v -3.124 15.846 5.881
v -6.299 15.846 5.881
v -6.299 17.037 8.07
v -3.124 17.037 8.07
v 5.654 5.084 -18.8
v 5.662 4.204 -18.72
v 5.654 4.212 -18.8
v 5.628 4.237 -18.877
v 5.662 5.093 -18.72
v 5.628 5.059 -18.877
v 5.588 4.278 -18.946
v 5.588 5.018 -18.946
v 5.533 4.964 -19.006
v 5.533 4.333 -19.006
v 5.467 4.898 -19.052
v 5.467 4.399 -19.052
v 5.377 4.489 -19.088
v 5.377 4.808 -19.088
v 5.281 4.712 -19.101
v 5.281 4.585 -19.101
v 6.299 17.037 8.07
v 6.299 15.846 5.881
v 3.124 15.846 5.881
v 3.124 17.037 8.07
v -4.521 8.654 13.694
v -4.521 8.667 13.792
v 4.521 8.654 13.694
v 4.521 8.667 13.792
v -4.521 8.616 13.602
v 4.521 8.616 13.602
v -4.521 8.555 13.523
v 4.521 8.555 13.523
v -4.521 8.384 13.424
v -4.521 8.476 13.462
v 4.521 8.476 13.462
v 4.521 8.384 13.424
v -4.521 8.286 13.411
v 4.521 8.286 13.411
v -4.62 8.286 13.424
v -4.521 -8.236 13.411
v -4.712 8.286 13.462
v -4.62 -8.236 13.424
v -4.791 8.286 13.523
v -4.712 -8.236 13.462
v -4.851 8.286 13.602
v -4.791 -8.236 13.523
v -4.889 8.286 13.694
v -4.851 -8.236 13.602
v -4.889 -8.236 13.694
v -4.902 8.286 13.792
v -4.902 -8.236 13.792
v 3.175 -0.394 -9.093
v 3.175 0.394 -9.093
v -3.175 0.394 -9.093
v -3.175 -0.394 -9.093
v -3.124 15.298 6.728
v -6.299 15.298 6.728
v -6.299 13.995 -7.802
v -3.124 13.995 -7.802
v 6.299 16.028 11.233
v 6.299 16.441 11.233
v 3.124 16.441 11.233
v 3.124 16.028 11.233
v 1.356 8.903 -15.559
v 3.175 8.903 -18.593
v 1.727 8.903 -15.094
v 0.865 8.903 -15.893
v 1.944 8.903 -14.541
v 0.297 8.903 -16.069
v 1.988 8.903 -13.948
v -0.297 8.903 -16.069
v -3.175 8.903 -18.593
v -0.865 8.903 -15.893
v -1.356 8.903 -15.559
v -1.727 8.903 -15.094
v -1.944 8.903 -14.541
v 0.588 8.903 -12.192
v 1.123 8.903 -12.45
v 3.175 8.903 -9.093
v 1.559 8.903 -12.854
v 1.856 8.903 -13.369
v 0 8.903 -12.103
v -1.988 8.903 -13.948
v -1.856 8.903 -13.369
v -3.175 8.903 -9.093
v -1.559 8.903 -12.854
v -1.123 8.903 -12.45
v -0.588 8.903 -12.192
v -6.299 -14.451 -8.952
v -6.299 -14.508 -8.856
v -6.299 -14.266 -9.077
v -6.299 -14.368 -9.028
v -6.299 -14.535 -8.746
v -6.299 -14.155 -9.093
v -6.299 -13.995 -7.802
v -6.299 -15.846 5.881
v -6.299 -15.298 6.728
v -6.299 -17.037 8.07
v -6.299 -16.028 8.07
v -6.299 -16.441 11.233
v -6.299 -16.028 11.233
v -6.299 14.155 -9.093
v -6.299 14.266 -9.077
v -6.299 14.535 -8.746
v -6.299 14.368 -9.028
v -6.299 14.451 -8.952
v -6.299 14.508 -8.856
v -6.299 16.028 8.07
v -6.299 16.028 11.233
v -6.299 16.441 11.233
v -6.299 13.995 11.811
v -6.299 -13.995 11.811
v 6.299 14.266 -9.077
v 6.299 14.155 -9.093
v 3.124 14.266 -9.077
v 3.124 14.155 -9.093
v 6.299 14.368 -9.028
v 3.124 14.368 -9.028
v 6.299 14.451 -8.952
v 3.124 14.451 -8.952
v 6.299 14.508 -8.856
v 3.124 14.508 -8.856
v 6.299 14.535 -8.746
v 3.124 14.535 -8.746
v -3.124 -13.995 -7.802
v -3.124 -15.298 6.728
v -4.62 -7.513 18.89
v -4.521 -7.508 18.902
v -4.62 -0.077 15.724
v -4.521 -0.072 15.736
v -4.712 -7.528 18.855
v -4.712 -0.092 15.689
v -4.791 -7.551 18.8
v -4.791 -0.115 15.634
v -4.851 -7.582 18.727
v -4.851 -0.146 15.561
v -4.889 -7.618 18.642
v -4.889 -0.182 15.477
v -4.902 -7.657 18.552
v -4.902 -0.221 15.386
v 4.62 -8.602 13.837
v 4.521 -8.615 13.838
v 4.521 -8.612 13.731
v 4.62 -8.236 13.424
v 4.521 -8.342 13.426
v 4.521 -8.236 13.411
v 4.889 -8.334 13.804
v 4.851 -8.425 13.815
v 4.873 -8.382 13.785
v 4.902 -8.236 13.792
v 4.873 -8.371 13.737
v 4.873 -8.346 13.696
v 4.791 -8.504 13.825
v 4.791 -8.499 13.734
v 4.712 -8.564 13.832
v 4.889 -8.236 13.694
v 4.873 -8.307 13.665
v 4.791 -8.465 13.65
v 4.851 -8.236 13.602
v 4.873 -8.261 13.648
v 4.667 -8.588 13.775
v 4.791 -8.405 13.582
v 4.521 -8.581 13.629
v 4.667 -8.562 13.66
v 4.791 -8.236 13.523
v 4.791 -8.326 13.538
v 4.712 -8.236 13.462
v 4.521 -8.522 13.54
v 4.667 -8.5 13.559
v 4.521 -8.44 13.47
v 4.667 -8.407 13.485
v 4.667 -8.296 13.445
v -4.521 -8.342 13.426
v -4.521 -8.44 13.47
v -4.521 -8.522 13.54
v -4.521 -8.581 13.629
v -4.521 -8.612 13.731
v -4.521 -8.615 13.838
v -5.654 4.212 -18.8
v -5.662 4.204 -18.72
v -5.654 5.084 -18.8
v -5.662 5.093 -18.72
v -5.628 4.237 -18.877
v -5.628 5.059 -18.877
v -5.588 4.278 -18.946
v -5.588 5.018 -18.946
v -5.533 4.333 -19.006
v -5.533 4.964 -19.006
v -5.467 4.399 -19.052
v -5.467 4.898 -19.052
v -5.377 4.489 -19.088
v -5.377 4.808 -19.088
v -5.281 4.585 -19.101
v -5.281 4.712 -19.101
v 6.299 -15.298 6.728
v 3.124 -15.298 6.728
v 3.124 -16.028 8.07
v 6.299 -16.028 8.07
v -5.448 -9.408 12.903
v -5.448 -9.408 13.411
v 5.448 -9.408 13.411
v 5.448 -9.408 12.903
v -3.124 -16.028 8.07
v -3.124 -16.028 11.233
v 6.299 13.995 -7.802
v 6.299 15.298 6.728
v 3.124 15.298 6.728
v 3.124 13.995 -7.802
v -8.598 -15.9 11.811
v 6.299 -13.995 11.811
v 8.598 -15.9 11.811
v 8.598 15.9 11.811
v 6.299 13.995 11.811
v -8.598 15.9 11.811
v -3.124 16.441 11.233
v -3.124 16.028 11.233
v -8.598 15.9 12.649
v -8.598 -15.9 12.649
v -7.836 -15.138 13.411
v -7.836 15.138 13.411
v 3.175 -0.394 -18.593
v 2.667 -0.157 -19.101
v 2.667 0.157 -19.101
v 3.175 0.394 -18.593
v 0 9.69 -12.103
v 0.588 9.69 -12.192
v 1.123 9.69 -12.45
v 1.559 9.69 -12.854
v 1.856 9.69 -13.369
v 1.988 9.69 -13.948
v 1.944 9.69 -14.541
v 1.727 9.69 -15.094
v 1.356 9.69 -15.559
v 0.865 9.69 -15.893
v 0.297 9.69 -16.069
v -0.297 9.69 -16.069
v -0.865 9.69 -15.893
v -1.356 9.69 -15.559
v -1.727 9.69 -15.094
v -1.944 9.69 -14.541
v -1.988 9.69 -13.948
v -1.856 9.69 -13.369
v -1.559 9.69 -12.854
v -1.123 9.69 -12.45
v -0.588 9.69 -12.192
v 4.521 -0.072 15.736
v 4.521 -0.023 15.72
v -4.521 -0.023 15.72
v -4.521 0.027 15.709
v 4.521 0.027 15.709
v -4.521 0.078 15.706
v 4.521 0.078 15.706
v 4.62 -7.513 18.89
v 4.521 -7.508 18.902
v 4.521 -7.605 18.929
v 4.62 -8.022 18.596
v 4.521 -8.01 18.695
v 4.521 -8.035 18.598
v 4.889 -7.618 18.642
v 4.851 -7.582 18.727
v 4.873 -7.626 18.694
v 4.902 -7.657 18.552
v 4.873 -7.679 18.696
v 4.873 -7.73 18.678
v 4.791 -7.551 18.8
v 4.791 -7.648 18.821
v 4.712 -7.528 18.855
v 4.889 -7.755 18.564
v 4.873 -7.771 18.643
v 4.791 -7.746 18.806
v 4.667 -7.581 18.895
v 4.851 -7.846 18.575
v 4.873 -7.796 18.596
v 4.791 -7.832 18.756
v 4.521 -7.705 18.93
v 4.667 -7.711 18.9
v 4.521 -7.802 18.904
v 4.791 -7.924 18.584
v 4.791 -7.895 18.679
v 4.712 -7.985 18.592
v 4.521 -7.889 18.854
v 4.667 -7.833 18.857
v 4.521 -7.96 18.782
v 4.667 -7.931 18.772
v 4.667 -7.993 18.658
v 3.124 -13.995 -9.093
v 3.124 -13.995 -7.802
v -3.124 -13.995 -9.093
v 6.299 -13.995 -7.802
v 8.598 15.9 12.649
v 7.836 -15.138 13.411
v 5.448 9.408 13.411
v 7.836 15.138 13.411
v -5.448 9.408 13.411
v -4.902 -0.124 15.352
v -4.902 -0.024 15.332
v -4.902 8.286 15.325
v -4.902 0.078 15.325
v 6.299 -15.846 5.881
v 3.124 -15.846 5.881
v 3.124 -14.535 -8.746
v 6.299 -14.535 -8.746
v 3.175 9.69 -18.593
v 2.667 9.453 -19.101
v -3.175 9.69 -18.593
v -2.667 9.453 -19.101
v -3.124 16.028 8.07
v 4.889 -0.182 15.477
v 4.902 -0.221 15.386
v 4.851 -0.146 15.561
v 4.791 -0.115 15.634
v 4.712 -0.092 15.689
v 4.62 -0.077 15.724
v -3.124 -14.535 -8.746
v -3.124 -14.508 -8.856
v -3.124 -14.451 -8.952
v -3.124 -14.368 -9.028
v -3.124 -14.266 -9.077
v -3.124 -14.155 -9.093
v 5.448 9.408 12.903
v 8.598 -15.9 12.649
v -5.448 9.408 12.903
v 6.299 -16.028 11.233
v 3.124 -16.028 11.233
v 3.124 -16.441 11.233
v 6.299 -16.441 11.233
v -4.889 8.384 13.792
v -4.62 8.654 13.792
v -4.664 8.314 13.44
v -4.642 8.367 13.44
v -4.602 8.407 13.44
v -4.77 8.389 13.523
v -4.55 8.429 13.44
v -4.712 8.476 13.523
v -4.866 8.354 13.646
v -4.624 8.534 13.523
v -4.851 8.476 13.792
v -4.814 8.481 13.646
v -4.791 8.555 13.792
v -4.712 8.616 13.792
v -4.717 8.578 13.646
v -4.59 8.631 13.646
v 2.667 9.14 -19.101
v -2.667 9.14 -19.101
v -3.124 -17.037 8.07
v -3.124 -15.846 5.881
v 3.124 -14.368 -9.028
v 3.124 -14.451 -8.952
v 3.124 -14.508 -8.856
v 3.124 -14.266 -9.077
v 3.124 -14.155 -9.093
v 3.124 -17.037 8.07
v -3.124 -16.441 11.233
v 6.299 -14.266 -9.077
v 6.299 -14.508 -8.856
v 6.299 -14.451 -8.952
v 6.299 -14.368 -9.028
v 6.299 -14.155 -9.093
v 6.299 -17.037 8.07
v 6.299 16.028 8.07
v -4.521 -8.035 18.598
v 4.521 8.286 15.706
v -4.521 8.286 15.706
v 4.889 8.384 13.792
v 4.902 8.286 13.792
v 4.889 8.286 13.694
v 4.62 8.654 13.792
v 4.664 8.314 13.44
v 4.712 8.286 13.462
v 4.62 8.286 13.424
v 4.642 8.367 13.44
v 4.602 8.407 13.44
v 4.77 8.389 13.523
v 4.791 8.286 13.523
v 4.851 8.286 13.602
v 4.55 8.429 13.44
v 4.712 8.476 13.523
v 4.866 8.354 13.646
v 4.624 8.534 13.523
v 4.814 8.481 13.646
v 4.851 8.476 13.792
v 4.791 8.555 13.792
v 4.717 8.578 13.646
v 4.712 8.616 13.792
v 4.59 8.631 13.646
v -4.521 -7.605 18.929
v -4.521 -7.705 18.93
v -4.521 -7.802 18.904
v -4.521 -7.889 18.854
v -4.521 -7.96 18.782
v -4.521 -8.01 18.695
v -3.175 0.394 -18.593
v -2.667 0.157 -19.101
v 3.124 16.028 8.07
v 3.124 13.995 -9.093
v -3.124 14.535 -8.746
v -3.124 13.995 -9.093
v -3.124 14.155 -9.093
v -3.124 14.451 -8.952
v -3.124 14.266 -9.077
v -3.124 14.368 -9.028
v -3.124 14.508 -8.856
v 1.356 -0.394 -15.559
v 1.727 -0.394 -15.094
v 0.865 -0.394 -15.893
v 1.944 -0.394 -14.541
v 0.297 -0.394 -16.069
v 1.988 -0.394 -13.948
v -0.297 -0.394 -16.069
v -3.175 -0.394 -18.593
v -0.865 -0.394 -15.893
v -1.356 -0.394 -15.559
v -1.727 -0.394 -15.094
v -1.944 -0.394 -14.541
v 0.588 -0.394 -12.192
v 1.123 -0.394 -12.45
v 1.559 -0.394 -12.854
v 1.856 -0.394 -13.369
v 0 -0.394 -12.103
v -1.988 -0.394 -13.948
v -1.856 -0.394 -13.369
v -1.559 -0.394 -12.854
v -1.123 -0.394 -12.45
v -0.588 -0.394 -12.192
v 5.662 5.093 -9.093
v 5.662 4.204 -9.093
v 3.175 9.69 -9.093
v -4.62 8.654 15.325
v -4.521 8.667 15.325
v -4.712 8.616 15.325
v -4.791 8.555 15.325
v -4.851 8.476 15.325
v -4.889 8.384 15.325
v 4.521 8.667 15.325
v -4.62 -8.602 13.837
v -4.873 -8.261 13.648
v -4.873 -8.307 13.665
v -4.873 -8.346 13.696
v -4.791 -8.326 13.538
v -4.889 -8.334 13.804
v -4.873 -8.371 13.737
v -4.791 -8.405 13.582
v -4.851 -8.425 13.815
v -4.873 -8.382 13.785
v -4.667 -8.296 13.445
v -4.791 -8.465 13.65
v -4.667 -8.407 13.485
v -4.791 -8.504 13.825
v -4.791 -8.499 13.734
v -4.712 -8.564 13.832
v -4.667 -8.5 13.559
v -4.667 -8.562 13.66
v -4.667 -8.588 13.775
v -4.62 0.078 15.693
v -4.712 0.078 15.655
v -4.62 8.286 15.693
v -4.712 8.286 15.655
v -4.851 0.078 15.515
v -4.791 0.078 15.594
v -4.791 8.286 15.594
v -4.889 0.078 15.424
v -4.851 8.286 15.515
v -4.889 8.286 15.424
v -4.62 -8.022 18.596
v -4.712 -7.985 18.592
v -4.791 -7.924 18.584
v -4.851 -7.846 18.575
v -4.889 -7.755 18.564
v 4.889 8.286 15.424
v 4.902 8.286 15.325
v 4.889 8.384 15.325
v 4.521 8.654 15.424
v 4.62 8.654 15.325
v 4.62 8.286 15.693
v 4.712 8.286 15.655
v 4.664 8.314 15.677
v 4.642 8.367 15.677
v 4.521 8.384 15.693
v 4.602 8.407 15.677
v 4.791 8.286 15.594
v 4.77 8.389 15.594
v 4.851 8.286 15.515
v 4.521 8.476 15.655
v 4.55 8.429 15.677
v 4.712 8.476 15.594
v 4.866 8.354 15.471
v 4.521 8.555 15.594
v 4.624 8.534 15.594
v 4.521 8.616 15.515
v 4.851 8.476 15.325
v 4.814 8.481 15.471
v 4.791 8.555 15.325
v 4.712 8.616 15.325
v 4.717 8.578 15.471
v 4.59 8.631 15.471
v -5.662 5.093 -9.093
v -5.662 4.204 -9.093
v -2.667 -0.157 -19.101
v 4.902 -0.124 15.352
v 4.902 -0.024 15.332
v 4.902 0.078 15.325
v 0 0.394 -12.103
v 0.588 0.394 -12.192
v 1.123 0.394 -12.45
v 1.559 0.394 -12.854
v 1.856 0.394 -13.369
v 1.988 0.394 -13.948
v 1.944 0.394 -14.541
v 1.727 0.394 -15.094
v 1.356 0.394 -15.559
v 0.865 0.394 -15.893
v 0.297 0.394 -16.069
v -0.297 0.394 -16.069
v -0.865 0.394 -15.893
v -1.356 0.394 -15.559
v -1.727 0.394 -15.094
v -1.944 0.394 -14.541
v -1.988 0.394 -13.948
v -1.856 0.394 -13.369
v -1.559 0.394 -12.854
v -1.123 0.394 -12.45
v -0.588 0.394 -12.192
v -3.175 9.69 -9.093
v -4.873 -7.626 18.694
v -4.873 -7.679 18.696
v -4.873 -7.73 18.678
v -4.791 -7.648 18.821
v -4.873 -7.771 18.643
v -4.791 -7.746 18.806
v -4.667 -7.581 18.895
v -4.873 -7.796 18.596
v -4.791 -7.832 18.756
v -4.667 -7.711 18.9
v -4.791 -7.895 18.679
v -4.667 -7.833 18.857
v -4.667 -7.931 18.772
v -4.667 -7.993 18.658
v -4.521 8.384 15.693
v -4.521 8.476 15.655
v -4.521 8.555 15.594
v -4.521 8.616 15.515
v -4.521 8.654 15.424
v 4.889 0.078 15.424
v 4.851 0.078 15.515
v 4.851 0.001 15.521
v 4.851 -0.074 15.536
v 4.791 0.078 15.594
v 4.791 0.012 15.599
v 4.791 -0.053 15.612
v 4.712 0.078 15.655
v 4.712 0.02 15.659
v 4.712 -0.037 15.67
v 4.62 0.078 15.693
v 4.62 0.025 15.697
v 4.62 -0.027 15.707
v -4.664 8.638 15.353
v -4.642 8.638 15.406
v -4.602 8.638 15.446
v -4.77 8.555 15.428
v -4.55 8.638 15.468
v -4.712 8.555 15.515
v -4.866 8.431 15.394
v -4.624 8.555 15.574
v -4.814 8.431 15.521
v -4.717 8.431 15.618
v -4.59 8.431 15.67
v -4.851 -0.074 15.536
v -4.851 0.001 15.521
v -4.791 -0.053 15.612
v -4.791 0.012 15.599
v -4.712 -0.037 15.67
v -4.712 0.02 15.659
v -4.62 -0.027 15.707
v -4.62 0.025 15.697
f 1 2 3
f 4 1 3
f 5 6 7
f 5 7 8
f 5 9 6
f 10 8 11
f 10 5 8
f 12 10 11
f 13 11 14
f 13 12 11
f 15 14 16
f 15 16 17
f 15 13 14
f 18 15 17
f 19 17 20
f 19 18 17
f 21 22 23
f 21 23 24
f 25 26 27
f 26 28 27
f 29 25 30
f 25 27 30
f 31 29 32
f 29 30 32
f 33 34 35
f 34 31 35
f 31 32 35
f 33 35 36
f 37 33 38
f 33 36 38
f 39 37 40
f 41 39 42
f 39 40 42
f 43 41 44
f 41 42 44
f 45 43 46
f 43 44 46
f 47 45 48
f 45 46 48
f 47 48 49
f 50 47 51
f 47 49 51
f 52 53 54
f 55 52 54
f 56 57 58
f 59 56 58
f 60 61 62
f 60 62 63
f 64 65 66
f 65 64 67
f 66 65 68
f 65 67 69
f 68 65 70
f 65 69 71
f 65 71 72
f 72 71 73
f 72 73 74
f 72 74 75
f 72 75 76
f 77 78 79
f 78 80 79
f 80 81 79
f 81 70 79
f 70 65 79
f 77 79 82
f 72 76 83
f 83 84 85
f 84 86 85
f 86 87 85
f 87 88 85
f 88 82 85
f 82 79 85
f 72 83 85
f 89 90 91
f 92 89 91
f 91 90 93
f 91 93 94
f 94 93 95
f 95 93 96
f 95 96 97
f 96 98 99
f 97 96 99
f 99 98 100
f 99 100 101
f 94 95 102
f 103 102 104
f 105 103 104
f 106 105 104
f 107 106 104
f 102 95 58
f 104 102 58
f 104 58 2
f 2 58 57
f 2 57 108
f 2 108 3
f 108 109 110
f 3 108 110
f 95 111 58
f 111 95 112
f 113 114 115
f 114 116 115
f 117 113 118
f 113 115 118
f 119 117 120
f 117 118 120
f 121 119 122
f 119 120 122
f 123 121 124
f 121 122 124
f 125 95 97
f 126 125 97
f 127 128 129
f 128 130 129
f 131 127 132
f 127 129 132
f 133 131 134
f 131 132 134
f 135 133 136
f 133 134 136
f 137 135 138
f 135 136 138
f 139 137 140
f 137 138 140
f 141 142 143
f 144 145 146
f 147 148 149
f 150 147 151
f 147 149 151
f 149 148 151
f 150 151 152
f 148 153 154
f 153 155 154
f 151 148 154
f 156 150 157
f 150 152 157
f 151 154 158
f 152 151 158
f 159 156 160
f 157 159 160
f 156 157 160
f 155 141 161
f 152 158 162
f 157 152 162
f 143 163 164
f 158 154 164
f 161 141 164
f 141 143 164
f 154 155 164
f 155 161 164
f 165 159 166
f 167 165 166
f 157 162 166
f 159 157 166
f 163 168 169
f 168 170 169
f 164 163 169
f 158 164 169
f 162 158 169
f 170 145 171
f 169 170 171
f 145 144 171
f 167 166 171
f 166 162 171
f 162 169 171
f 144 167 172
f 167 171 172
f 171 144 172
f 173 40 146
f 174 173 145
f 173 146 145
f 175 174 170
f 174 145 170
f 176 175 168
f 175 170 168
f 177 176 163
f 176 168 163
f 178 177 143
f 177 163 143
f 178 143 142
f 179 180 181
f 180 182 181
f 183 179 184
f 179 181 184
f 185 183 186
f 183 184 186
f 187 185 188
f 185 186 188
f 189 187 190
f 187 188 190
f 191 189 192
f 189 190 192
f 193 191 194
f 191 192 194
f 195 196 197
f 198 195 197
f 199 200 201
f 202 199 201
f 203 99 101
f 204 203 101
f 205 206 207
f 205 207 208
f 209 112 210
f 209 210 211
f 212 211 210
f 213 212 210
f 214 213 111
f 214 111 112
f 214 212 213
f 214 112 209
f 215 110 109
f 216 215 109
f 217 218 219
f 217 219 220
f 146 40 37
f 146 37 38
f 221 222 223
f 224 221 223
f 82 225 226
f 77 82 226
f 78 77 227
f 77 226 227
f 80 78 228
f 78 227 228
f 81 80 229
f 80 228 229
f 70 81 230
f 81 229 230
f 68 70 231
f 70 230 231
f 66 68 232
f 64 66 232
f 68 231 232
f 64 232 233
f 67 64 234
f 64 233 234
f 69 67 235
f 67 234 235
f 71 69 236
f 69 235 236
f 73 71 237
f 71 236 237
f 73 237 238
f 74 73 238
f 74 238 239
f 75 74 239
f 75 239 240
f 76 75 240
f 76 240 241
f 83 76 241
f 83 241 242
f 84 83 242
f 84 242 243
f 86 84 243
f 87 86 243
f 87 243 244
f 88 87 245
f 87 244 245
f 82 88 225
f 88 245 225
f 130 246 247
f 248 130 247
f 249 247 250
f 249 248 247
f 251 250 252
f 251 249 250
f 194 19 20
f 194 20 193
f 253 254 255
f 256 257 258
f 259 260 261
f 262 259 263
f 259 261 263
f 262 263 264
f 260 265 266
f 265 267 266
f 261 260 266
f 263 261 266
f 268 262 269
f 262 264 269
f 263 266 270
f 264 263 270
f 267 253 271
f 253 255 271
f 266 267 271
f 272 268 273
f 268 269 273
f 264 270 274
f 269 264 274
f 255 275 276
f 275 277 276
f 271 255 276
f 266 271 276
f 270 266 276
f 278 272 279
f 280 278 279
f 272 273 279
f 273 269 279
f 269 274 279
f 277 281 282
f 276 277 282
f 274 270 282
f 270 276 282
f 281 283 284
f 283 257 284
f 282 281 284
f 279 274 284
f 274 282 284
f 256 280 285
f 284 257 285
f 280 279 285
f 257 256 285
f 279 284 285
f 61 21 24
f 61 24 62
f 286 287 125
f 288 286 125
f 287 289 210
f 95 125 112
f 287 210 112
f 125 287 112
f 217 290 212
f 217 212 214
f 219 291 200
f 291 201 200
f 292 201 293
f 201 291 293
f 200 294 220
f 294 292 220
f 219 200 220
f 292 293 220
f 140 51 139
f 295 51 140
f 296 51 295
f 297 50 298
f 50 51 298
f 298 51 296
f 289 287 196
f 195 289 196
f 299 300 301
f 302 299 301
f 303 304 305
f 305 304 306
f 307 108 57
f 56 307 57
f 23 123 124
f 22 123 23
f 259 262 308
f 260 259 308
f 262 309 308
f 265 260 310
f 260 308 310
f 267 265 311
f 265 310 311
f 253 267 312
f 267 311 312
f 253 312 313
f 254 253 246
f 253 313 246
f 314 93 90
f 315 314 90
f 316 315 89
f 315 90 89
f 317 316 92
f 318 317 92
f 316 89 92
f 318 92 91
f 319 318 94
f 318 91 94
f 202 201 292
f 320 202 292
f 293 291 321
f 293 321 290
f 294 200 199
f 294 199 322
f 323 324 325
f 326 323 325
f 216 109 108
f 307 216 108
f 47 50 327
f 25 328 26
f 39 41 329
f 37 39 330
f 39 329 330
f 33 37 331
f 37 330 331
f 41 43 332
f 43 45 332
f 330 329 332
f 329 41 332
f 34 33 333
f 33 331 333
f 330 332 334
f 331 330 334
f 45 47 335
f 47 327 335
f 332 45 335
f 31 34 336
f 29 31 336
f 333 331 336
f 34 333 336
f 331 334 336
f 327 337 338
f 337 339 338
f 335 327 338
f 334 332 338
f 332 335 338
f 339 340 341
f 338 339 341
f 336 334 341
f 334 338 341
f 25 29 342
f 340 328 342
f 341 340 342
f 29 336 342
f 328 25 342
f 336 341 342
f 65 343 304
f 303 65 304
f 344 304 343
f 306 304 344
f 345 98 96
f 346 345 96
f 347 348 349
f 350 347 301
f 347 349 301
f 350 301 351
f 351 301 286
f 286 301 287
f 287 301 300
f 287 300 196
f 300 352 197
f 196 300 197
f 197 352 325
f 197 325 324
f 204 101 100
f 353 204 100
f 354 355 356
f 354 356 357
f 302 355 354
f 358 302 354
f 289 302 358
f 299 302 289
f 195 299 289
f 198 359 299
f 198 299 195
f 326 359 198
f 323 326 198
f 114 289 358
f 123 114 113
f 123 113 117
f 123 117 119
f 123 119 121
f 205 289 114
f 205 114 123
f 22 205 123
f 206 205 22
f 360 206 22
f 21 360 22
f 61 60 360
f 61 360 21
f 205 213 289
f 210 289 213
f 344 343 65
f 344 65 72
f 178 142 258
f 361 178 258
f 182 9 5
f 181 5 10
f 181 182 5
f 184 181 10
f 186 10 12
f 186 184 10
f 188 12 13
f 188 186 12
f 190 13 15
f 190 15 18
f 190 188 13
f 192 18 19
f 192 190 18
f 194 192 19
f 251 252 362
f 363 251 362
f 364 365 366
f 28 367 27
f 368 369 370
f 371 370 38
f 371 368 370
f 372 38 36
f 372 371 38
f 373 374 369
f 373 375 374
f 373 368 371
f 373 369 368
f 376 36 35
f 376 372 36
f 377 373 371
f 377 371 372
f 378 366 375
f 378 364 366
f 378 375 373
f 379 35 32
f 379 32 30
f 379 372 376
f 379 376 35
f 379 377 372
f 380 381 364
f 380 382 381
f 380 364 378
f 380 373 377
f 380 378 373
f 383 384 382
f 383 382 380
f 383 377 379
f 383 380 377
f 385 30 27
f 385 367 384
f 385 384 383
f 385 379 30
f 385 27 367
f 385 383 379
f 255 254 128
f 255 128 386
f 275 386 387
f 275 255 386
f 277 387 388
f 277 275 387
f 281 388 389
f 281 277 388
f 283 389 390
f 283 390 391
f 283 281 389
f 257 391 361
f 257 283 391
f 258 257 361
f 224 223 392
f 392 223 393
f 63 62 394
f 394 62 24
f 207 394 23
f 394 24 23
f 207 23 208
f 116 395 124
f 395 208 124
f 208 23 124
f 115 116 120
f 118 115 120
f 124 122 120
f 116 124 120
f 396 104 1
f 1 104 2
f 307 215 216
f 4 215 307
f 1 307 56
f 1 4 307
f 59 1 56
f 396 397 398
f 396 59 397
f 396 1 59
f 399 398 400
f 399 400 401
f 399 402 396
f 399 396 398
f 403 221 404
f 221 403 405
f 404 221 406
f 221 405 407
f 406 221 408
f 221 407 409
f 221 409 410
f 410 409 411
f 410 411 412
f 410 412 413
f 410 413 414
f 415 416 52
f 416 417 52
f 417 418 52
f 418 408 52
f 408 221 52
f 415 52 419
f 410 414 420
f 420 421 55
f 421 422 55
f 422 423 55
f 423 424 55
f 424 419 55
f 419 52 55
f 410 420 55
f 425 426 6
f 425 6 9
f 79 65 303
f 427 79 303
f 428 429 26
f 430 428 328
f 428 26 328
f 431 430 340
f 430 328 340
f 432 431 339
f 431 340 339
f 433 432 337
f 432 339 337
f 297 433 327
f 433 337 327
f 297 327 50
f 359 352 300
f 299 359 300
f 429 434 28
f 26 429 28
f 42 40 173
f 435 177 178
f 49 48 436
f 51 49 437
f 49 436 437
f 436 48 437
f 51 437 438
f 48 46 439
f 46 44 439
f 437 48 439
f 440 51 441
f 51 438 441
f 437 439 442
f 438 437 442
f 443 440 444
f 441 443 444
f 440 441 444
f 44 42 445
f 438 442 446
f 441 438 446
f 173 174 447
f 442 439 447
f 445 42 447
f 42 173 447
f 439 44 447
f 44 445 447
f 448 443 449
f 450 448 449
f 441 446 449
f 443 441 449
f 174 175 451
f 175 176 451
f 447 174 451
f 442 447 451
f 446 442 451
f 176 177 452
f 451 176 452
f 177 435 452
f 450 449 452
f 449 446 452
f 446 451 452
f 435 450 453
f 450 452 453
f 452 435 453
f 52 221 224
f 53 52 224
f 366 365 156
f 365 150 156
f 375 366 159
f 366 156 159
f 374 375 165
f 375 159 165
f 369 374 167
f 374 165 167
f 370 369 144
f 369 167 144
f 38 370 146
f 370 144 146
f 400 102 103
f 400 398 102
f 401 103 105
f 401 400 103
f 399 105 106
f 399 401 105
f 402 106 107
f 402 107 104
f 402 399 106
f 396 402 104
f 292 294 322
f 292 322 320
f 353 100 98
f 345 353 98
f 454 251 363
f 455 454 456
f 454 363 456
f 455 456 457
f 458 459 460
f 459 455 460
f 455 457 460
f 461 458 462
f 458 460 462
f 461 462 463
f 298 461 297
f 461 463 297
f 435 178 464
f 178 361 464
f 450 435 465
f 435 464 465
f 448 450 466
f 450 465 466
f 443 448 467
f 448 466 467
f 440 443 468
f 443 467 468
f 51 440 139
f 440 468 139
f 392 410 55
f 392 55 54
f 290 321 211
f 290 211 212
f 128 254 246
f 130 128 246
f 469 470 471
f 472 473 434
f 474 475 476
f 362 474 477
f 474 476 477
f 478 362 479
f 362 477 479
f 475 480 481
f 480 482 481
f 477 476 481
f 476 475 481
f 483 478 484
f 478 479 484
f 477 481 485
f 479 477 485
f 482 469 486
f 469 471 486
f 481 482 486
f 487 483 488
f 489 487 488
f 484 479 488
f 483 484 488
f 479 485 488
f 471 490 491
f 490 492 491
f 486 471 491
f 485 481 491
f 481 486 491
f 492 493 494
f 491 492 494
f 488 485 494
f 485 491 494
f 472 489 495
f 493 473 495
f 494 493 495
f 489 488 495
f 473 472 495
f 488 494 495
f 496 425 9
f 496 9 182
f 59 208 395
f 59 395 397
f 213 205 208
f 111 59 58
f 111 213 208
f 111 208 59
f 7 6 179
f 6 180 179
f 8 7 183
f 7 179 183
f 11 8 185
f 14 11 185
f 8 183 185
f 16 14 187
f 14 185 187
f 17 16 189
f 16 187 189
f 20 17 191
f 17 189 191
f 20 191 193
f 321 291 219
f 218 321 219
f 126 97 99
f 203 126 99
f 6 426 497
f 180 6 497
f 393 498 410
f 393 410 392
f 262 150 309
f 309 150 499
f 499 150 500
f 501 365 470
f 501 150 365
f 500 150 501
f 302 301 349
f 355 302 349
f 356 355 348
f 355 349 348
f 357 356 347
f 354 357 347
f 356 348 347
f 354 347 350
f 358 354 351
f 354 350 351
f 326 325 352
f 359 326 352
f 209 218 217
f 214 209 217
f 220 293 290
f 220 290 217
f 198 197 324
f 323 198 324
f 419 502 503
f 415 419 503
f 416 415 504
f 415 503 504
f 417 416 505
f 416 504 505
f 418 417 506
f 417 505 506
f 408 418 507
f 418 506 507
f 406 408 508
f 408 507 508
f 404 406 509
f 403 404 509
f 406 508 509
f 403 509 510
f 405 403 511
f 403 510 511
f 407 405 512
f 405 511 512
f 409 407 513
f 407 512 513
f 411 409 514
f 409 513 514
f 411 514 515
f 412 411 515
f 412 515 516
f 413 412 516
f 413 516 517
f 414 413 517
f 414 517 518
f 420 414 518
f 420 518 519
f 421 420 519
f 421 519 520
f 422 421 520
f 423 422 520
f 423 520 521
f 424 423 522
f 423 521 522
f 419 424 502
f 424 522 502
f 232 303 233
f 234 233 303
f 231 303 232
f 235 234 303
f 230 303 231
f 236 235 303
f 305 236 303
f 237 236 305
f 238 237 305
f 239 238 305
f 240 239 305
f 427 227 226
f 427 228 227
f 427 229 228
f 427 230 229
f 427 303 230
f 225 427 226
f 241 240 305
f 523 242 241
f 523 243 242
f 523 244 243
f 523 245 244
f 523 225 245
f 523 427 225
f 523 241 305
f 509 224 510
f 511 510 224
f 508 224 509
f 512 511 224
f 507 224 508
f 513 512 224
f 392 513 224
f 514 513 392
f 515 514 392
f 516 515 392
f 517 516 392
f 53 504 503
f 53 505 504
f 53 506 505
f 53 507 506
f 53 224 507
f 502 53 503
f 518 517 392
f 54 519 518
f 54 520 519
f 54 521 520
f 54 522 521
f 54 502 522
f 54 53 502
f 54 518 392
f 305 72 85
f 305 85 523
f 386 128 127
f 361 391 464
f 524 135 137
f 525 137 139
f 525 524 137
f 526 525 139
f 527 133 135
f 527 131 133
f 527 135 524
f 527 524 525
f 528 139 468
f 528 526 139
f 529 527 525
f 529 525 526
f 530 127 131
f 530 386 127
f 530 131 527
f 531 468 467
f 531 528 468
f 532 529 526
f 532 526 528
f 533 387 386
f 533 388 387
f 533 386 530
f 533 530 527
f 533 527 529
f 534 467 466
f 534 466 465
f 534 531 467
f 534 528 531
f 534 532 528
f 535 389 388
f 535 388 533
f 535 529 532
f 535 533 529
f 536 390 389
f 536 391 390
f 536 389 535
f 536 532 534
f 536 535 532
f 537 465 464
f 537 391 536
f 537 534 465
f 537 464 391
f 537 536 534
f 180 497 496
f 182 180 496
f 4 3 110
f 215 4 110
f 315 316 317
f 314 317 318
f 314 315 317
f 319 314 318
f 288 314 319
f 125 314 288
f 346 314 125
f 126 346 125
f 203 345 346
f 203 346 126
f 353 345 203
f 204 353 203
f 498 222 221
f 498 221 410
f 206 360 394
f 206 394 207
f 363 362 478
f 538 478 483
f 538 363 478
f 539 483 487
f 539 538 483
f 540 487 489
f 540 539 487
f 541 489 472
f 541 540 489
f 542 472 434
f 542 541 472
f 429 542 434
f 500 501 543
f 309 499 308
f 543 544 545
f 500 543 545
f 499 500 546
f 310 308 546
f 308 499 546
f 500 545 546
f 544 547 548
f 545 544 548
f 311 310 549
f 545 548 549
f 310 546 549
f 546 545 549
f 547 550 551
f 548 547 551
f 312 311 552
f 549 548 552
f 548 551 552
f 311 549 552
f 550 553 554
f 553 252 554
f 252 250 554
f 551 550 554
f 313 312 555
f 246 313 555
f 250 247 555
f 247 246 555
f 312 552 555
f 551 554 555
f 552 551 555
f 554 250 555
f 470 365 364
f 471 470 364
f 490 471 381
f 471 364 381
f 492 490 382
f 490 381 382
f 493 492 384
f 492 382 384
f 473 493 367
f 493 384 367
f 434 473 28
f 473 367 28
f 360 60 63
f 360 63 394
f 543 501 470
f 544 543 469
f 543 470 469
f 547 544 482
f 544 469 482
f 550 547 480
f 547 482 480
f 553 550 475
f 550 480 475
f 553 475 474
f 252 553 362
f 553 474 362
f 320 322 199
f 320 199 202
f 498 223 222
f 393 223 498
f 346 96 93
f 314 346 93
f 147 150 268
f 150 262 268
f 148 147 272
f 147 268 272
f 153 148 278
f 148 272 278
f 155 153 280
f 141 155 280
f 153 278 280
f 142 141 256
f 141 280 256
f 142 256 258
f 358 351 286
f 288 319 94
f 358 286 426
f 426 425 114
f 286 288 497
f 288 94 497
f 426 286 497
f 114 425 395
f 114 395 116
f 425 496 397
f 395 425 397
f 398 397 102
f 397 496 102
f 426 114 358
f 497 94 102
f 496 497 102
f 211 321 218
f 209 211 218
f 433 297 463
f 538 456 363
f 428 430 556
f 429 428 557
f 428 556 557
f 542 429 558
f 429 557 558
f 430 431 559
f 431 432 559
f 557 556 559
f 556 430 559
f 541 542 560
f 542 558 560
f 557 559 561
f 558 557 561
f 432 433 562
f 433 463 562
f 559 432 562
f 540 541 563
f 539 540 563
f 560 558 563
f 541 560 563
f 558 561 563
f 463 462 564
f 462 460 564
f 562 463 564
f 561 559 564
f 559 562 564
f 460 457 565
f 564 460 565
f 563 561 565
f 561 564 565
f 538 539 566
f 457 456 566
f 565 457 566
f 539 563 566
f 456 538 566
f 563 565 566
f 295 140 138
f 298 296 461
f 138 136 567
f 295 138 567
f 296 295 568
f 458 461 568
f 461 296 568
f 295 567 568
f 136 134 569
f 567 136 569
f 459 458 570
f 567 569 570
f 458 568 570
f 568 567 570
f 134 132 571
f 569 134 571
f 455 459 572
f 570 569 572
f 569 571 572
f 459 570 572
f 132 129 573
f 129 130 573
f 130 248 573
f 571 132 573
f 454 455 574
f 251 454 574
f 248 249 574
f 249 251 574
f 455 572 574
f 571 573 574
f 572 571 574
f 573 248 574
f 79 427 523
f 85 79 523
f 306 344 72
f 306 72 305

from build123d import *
from OCP.BRepFilletAPI import BRepFilletAPI_MakeChamfer

# Parameters (mm, degrees)
BOSS_EXTRUDE1_DEPTH  = 4.9022
SKETCH3_W            = 17.1958
SKETCH3_H            = 31.8008
BOSS_EXTRUDE2_DEPTH  = 1.6002
CHAMFER1_SIZE        = 0.762
SKETCH4_W            = 10.896044092
SKETCH4_H            = 18.816032884
CUT_EXTRUDE2_DEPTH   = 0.508
SKETCH5_W            = 12.5984
SKETCH5_H            = 27.9908
BOSS_EXTRUDE3_DEPTH  = 20.9042
SKETCH6_W            = 6.35
SKETCH6_H            = 0.7874
BOSS_EXTRUDE4_DEPTH  = 10.0076
CHAMFER2_SIZE        = 0.508
CHAMFER3_SIZE        = 0.508
CHAMFER3_SIZE2       = 0.23688429
SKETCH7_R            = 1.9939
CUT_EXTRUDE3_DEPTH   = 0.7874
LPATTERN1_COUNT      = 2
LPATTERN1_PITCH      = 9.2964
SKETCH9_W            = 11.324393704
SKETCH9_H            = 0.889
BOSS_EXTRUDE5_DEPTH  = 10.0076
FILLET1_R            = 0.381
BOSS_EXTRUDE6_DEPTH  = 3.175
FILLET2_R            = 0.381
FILLET2_OF_MIRROR3_R = 0.381
MIRROR4_START        = -6.2992
MIRROR4_DEPTH        = 3.175
MIRROR4_START_2      = 3.1242
MIRROR4_2_DEPTH      = 3.175
FILLET3_R            = 0.381


# Read off the part's stored shape, not the designer's step: Mirror4
with BuildPart() as part:
    # Sketch2 → Boss-Extrude1 (new, symmetric)
    with BuildSketch(Plane(origin=(0, 0, 0), x_dir=(0, 0, -1), z_dir=(1, 0, 0))):
        Polygon((-19.1008, -7.973972857), (-15.705952073, 0), (-15.705952073, 8.666558462), (-13.4112, 8.666558462), (-13.4112, -8.666558462), align=None)
    extrude(amount=BOSS_EXTRUDE1_DEPTH, both=True)

    # Sketch3 → Boss-Extrude2 (add)
    with BuildSketch(Plane(origin=(0, 0, 13.4112), x_dir=(-1, 0, 0), z_dir=(0, 0, -1))):
        Rectangle(SKETCH3_W, SKETCH3_H)
    extrude(amount=BOSS_EXTRUDE2_DEPTH)

    # Chamfer1
    chamfer1_edges = [part.edges().sort_by_distance(p)[0] for p in [
        (-8.5979, 0, 13.4112),
        (0, 15.9004, 13.4112),
        (8.5979, 0, 13.4112),
        (0, -15.9004, 13.4112),
    ]]
    chamfer(chamfer1_edges, length=CHAMFER1_SIZE)

    # Sketch4 → Cut-Extrude2 (cut)
    with BuildSketch(Plane.XY.offset(13.4112)):
        Rectangle(SKETCH4_W, SKETCH4_H)
    extrude(amount=-CUT_EXTRUDE2_DEPTH, mode=Mode.SUBTRACT)


with BuildPart() as cut_extrude2_piece_1:
    # of the separate pieces the step leaves, piece 1, a body of its own (cut_extrude2_pieces)
    add(part.part.solids().sort_by_distance((8.5979, 15.9004, 12.6492))[0])

    # Sketch5 → Boss-Extrude3 (add)
    with BuildSketch(Plane(origin=(0, 0, 11.811), x_dir=(-1, 0, 0), z_dir=(0, 0, -1))):
        Rectangle(SKETCH5_W, SKETCH5_H)
    extrude(amount=BOSS_EXTRUDE3_DEPTH)

    # Sketch9 → Boss-Extrude5 (add)
    with BuildSketch(Plane(origin=(0, 0, -9.0932), x_dir=(-1, 0, 0), z_dir=(0, 0, -1))):
        with Locations((0, 4.6482)):
            Rectangle(SKETCH9_W, SKETCH9_H)
    extrude(amount=BOSS_EXTRUDE5_DEPTH)

    # Fillet1
    fillet1_edges = [cut_extrude2_piece_1.edges().sort_by_distance(p)[0] for p in [
        (-5.662196852, 4.6482, -19.1008),
        (0, 5.0927, -19.1008),
        (5.662196852, 4.6482, -19.1008),
        (0, 4.2037, -19.1008),
    ]]
    fillet(fillet1_edges, radius=FILLET1_R)

    # Sketch11 → Boss-Extrude6 (add)
    with BuildSketch(Plane(origin=(6.2992, 0, 0), x_dir=(0, 0, -1), z_dir=(1, 0, 0))):
        Polygon((9.0932, 13.9954), (9.0932, 14.5034), (-5.880915867, 15.845854324), (-8.069641774, 17.036875135), (-11.233356301, 16.44136473), (-11.233356301, 16.028204475), (-8.069641774, 16.028204475), (-6.727879648, 15.298068915), (7.80245849, 13.9954), align=None)
    boss_extrude6 = extrude(amount=-BOSS_EXTRUDE6_DEPTH)

    # Fillet2
    fillet2_edges = [cut_extrude2_piece_1.edges().sort_by_distance(p)[0] for p in [
        (4.7117, 14.5034, -9.0932),
    ]]
    fillet(fillet2_edges, radius=FILLET2_R)

    # Mirror3: Boss-Extrude6 across plane
    add(boss_extrude6.mirror(Plane(origin=(0, 0, 0), x_dir=(0, 0, 1), z_dir=(1, 0, 0))))

    # Fillet2 of Mirror3
    fillet2_of_mirror3_edges = [cut_extrude2_piece_1.edges().sort_by_distance(p)[0] for p in [
        (-4.7117, 14.5034, -9.0932),
    ]]
    fillet(fillet2_of_mirror3_edges, radius=FILLET2_OF_MIRROR3_R)

    # Mirror4 outline → Mirror4 (add)
    with BuildSketch(Plane.YZ.offset(MIRROR4_START)):
        with BuildLine():
            Line((-16.028204475, 8.069641774), (-16.028204475, 11.233356301))
            Line((-16.028204475, 11.233356301), (-16.44136473, 11.233356301))
            Line((-16.44136473, 11.233356301), (-17.036875135, 8.069641774))
            Line((-17.036875135, 8.069641774), (-15.845854324, 5.880915867))
            Line((-15.845854324, 5.880915867), (-14.534507258, -8.746220836))
            ThreePointArc((-14.534507258, -8.746220836), (-14.412127508, -8.993378714), (-14.155029218, -9.0932))
            Line((-14.155029218, -9.0932), (-13.9954, -9.0932))
            Line((-13.9954, -9.0932), (-13.9954, -7.80245849))
            Line((-13.9954, -7.80245849), (-15.298068915, 6.727879648))
            Line((-15.298068915, 6.727879648), (-16.028204475, 8.069641774))
        make_face()
    extrude(amount=MIRROR4_DEPTH)

    # Mirror4 2 outline → Mirror4 2 (add)
    with BuildSketch(Plane.YZ.offset(MIRROR4_START_2)):
        with BuildLine():
            Line((-16.028204475, 8.069641774), (-16.028204475, 11.233356301))
            Line((-16.028204475, 11.233356301), (-16.44136473, 11.233356301))
            Line((-16.44136473, 11.233356301), (-17.036875135, 8.069641774))
            Line((-17.036875135, 8.069641774), (-15.845854324, 5.880915867))
            Line((-15.845854324, 5.880915867), (-14.534507258, -8.746220836))
            ThreePointArc((-14.534507258, -8.746220836), (-14.412127508, -8.993378714), (-14.155029218, -9.0932))
            Line((-14.155029218, -9.0932), (-13.9954, -9.0932))
            Line((-13.9954, -9.0932), (-13.9954, -7.80245849))
            Line((-13.9954, -7.80245849), (-15.298068915, 6.727879648))
            Line((-15.298068915, 6.727879648), (-16.028204475, 8.069641774))
        make_face()
    extrude(amount=MIRROR4_2_DEPTH)


with BuildPart() as cut_extrude2_piece_2:
    # of the separate pieces the step leaves, piece 2, a body of its own (cut_extrude2_pieces)
    add(part.part.solids().sort_by_distance((-4.9022, 8.666558462, 15.705952073))[0])

    # Fillet3
    fillet3_edges = [cut_extrude2_piece_2.edges().sort_by_distance(p)[0] for p in [
        (4.9022, 8.666558462, 14.558576037),
        (4.9022, 4.333279231, 15.705952073),
        (4.9022, -3.986986428, 17.403376037),
        (4.9022, -8.320265659, 16.256),
        (-4.9022, -3.986986428, 17.403376037),
        (-4.9022, 4.333279231, 15.705952073),
        (-4.9022, 8.666558462, 14.558576037),
        (-4.9022, 0, 13.4112),
        (-4.9022, -8.320265659, 16.256),
        (4.9022, 0, 13.4112),
        (0, -7.973972857, 19.1008),
        (0, 0, 15.705952073),
        (0, 8.666558462, 15.705952073),
        (0, 8.666558462, 13.4112),
        (0, -8.666558462, 13.4112),
    ]]
    fillet(fillet3_edges, radius=FILLET3_R)


with BuildPart() as body_3:
    # Sketch6 → Boss-Extrude4 (new body)
    with BuildSketch(Plane(origin=(0, 0, -9.0932), x_dir=(-1, 0, 0), z_dir=(0, 0, -1))):
        with Locations((0, 9.2964)):
            Rectangle(SKETCH6_W, SKETCH6_H)
    extrude(amount=BOSS_EXTRUDE4_DEPTH)

    # Chamfer2
    chamfer2_edges = [body_3.edges().sort_by_distance(p)[0] for p in [
        (3.175, 9.2964, -19.1008),
        (-3.175, 9.2964, -19.1008),
    ]]
    chamfer(chamfer2_edges, length=CHAMFER2_SIZE)

    # Chamfer3: one chamfer whose edges measure the first distance from different faces: ONE call of the kernel's chamfer builder (chamfer() names one face for all edges)
    chamfer3_edges_1 = [body_3.edges().sort_by_distance(p)[0] for p in [
        (0, 8.9027, -19.1008),
    ]]
    chamfer3_side_1 = [body_3.faces().sort_by_distance(p)[0] for p in [
        (0, 8.9027, -14.077287598),
    ]]
    chamfer3_edges_2 = [body_3.edges().sort_by_distance(p)[0] for p in [
        (0, 9.6901, -19.1008),
    ]]
    chamfer3_side_2 = [body_3.faces().sort_by_distance(p)[0] for p in [
        (0, 9.6901, -14.077287598),
    ]]
    chamfer3 = BRepFilletAPI_MakeChamfer(body_3.part.solid().wrapped)
    for e in chamfer3_edges_1:
        chamfer3.Add(CHAMFER3_SIZE, CHAMFER3_SIZE2, e.wrapped, chamfer3_side_1[0].wrapped)  # the first distance lies on this face
    for e in chamfer3_edges_2:
        chamfer3.Add(CHAMFER3_SIZE, CHAMFER3_SIZE2, e.wrapped, chamfer3_side_2[0].wrapped)  # the first distance lies on this face
    add(Compound.cast(chamfer3.Shape()), mode=Mode.REPLACE)

    # Sketch7 → Cut-Extrude3 (cut)
    with BuildSketch(Plane(origin=(0, 9.6901, 0), x_dir=(1, 0, 0), z_dir=(0, 1, 0))):
        with Locations(Location((0, 14.097, 0), (0, 0, 270))):
            Circle(SKETCH7_R)
    extrude(amount=-CUT_EXTRUDE3_DEPTH, mode=Mode.SUBTRACT)


with BuildPart() as lpattern1_1:
    # LPattern1: pattern copy
    add(body_3.part.moved(Location(Vector(0, -1, 0) * (1 * LPATTERN1_PITCH))))


solid = Compound([cut_extrude2_piece_1.part, cut_extrude2_piece_2.part, body_3.part, lpattern1_1.part])
